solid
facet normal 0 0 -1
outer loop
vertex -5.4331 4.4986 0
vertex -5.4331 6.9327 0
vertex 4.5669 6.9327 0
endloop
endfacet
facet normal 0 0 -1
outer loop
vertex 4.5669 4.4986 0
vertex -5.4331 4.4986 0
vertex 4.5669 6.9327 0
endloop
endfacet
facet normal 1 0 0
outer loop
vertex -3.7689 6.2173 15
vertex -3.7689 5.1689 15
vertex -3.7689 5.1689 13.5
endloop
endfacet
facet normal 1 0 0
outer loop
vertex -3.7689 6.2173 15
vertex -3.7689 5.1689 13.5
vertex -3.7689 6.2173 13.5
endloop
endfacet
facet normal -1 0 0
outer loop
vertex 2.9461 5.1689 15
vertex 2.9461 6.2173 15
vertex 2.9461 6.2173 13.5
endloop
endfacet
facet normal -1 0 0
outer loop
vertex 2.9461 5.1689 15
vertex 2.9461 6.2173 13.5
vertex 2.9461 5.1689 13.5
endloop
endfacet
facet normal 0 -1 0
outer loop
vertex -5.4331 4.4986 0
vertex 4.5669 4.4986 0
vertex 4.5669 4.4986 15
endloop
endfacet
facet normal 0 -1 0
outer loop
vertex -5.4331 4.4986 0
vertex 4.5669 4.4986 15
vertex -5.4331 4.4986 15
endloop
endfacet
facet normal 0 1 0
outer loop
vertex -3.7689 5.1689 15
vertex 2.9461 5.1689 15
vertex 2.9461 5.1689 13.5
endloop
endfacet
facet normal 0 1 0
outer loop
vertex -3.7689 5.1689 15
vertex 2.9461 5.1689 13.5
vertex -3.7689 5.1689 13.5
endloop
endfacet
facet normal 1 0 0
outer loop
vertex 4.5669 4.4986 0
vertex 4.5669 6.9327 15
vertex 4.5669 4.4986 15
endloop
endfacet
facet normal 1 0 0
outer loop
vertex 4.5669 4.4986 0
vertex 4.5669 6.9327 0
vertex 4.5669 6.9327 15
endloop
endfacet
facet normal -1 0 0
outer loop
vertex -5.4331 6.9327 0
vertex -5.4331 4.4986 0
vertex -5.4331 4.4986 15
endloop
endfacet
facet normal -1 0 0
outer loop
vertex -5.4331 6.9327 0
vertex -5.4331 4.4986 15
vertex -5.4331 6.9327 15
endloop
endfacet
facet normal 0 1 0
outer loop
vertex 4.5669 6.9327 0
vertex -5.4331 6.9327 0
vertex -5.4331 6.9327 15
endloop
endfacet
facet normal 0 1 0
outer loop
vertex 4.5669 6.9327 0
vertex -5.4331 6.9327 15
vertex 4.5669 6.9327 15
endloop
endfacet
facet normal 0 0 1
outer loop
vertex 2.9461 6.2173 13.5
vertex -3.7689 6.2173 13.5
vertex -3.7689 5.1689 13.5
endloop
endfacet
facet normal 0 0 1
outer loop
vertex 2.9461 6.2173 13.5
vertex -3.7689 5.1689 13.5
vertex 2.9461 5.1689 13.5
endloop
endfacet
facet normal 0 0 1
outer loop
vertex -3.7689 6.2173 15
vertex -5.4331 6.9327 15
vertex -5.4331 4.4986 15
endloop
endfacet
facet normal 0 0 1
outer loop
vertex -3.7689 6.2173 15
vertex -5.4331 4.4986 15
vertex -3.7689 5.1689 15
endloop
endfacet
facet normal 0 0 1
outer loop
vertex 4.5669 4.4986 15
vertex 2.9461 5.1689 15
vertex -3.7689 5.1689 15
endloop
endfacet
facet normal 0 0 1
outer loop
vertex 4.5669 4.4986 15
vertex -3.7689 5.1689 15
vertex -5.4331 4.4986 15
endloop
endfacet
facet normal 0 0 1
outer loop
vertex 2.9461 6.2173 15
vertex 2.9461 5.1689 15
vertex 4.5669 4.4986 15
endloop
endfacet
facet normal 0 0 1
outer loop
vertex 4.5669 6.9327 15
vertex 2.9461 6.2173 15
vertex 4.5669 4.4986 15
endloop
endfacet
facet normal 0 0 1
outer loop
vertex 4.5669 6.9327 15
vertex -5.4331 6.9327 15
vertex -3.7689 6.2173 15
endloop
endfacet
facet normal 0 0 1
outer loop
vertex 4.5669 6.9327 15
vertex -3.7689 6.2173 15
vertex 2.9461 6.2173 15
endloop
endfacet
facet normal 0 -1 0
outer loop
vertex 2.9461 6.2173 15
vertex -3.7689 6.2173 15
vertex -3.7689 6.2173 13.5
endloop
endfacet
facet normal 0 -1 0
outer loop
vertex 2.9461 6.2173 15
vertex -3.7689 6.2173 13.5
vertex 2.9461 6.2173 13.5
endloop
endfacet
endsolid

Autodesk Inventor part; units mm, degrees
ref_plane "YZ Plane" through (0, 0, 0) normal (1, 0, 0) x (0, 1, 0)
ref_plane "XZ Plane" through (0, 0, 0) normal (0, 1, 0) x (-1, 0, 0)
ref_plane "XY Plane" through (0, 0, 0) normal (0, 0, 1) x (1, 0, 0)
sketch "Sketch1" plane through (0, 0, 0) normal (0, 0, 1) x (1, 0, 0)
  line L0 (-5.4331, 6.9327) -> (4.5669, 6.9327)
  line L1 (4.5669, 6.9327) -> (4.5669, 4.4986)
  line L2 (4.5669, 4.4986) -> (-5.4331, 4.4986)
  line L3 (-5.4331, 4.4986) -> (-5.4331, 6.9327)
  point P0 (0, 0)
  dimension "d0" = 10
extrude "Extrusion1" add sketch "Sketch1" along normal blind 15
sketch "Sketch2" plane through (0, 0, 15) normal (0, 0, 1) x (1, 0, 0)
  line L0 (-3.7689, 6.2173) -> (2.9461, 6.2173)
  line L1 (2.9461, 6.2173) -> (2.9461, 5.1689)
  line L2 (2.9461, 5.1689) -> (-3.7689, 5.1689)
  line L3 (-3.7689, 5.1689) -> (-3.7689, 6.2173)
  point P0 (0, 0)
extrude "Extrusion2" cut sketch "Sketch2" against normal blind 1.5
properties part number "cutter grp 17-2"
